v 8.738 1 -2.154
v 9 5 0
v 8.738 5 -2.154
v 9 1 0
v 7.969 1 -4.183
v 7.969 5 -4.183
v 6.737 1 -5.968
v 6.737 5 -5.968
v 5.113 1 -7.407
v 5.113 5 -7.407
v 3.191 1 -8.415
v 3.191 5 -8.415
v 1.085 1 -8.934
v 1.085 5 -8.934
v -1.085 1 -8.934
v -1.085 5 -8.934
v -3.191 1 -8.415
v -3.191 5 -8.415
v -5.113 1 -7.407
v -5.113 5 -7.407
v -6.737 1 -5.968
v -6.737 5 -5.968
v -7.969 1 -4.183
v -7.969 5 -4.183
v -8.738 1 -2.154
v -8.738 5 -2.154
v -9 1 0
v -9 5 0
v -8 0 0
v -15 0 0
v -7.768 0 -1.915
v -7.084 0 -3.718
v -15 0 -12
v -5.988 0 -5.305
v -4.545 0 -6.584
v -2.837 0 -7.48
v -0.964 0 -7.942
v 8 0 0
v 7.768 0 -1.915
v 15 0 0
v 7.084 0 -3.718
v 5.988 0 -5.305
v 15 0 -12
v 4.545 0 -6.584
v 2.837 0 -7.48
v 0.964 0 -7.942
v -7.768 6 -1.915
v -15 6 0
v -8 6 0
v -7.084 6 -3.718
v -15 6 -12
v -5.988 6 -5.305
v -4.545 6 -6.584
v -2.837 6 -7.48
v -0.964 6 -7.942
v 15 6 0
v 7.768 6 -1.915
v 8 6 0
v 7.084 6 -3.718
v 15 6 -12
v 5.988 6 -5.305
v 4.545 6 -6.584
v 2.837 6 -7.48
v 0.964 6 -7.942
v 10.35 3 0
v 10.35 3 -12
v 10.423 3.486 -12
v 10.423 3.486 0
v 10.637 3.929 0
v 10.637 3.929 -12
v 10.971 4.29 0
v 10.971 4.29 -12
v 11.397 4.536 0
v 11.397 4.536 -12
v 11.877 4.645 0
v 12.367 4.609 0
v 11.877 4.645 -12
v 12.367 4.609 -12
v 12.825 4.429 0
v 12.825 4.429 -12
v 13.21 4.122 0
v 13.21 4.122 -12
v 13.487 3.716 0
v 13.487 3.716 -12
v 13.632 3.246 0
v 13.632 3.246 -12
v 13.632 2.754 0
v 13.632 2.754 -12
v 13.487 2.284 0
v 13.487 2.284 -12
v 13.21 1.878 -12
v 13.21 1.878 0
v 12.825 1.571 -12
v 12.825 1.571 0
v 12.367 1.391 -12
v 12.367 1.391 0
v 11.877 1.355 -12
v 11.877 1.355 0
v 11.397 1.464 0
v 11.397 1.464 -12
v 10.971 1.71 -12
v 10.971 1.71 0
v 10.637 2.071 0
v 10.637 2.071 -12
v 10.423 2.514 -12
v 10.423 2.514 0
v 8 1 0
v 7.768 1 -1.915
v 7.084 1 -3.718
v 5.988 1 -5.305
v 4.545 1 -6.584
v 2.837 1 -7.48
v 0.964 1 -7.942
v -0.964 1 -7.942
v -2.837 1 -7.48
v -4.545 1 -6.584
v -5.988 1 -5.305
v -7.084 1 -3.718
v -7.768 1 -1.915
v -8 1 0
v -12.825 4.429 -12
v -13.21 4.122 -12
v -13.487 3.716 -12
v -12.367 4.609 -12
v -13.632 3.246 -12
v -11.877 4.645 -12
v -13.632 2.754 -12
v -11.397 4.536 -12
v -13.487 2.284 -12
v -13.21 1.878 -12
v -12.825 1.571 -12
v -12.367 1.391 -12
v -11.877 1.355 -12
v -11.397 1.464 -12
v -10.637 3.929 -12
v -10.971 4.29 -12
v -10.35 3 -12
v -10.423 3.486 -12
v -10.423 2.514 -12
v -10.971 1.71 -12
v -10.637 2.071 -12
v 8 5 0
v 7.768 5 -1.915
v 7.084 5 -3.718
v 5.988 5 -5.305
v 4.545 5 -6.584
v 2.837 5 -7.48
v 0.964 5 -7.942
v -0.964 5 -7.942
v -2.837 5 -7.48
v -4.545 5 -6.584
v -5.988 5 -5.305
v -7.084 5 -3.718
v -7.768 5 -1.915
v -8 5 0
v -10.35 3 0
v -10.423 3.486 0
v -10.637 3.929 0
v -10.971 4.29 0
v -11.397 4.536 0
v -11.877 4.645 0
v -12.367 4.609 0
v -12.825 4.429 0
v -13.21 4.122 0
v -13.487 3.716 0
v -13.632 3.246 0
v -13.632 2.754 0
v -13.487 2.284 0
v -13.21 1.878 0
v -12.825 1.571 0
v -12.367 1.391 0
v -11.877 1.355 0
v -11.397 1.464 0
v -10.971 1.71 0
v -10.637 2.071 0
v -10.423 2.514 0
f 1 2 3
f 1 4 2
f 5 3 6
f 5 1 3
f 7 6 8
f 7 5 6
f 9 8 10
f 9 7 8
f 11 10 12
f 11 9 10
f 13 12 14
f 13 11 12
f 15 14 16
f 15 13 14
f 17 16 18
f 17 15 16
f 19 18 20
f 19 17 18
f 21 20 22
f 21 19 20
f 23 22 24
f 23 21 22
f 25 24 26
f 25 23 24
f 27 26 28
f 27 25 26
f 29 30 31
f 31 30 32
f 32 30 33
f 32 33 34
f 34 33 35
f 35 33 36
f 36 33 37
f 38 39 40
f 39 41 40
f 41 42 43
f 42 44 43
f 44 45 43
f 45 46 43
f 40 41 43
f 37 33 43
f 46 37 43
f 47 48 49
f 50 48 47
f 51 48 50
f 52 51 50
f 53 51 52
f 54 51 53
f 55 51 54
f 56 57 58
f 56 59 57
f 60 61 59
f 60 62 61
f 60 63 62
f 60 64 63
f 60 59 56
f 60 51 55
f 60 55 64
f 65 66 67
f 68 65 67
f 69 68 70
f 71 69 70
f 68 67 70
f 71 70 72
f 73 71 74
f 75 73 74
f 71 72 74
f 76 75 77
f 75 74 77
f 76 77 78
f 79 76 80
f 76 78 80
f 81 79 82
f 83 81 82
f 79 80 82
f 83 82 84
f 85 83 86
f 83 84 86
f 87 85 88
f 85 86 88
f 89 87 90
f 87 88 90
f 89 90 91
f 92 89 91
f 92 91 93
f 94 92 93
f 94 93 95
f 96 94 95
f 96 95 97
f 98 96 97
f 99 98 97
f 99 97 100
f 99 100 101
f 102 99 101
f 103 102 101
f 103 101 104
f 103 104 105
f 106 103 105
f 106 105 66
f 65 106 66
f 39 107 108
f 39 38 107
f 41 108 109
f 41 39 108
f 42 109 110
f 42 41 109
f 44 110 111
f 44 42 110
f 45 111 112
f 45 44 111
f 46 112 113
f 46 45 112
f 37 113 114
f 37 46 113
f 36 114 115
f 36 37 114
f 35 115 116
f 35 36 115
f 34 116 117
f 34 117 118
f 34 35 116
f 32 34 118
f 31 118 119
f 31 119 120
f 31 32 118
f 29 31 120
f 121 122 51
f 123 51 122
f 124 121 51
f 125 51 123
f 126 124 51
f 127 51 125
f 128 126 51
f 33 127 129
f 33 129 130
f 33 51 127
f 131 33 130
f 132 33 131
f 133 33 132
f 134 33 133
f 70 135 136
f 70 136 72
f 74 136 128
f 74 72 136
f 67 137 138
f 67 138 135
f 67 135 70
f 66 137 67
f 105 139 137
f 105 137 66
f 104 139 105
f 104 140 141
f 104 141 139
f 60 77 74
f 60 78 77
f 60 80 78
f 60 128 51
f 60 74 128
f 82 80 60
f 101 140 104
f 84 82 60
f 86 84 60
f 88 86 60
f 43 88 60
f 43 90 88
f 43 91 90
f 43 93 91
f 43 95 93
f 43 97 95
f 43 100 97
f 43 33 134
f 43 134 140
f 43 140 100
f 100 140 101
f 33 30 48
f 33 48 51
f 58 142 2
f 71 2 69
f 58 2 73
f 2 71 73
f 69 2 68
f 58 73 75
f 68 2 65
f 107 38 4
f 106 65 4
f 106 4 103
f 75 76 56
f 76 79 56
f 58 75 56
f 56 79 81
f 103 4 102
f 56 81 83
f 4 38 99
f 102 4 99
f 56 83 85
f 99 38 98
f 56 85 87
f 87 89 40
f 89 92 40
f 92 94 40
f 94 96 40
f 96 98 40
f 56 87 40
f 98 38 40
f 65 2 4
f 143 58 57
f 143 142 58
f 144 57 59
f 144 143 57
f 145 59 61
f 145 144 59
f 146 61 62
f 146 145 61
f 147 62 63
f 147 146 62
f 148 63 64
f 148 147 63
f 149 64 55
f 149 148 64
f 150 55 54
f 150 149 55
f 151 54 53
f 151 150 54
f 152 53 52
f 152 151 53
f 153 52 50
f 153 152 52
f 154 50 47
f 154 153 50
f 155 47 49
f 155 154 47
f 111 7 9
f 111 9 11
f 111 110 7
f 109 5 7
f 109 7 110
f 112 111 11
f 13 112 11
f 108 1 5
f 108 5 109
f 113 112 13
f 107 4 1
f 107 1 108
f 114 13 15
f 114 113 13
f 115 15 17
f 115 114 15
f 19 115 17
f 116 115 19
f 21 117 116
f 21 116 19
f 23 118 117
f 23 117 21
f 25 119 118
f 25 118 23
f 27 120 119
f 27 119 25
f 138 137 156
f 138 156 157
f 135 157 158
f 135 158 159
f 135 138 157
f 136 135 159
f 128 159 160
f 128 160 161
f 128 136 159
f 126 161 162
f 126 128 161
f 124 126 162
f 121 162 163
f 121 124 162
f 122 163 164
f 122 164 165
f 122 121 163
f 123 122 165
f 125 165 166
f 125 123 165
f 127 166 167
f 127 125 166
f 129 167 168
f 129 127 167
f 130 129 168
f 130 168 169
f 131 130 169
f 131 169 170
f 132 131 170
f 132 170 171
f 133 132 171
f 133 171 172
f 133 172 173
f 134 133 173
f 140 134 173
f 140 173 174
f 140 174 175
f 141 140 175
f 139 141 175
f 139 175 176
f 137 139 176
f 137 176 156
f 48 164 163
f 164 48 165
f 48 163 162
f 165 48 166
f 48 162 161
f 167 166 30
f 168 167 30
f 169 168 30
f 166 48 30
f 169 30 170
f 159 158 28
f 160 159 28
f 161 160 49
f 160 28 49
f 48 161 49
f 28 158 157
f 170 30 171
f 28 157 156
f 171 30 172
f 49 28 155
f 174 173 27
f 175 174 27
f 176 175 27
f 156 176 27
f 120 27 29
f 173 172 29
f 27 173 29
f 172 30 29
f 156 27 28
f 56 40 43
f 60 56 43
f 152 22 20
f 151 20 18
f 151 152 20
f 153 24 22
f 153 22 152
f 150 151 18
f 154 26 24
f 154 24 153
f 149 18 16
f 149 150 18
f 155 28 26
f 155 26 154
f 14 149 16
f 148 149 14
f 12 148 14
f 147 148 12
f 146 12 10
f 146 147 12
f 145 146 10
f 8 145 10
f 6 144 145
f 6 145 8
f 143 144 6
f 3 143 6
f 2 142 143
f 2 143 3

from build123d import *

# Parameters (mm, degrees)
SKETCH_1_W          = 30
SKETCH_1_H          = 12
EXTRUDE_1_DEPTH     = 6
CUT_EXTRUDE_2_REACH = 22.125
SKETCH_4_R          = 1.65


with BuildPart() as part:
    # 草图1 → 凸台-拉伸1 (new body)
    with BuildSketch(Plane(origin=(0, 0, 0), x_dir=(1, 0, 0), z_dir=(0, 1, 0))):
        with Locations((0, 6)):
            Rectangle(SKETCH_1_W, SKETCH_1_H)
    extrude(amount=EXTRUDE_1_DEPTH)

    # 草图2 → 切除-旋转1 (revolve, cut)
    with BuildSketch(Plane.XY):
        Polygon((-8, 0), (0, 0), (0, 3), (-9, 3), (-9, 1), (-8, 1), align=None)
        Polygon((-9, 3), (0, 3), (0, 6), (-8, 6), (-8, 5), (-9, 5), align=None)
    revolve(axis=Axis((0, 0, 0), (0, 1, 0)), mode=Mode.SUBTRACT)

    # 草图4 → 切除-拉伸2 (cut, up to next)
    with BuildSketch(Plane(origin=(0, 0, -12), x_dir=(-1, 0, 0), z_dir=(0, 0, -1)), mode=Mode.PRIVATE) as cut_extrude_2_sk1:
        with Locations((-12, 3)):
            Circle(SKETCH_4_R)
    cut_extrude_2_tool1 = extrude(cut_extrude_2_sk1.sketch, amount=-CUT_EXTRUDE_2_REACH, mode=Mode.PRIVATE) & part.part
    cut_extrude_2 = cut_extrude_2_tool1.solids().sort_by_distance((12, 3, -12))[0]
    add(cut_extrude_2, mode=Mode.SUBTRACT)

    # 镜向1: 切除-拉伸2 across plane
    add(cut_extrude_2.mirror(Plane(origin=(0, 0, 0), x_dir=(0, 0, 1), z_dir=(1, 0, 0))), mode=Mode.SUBTRACT)


solid = part.part
